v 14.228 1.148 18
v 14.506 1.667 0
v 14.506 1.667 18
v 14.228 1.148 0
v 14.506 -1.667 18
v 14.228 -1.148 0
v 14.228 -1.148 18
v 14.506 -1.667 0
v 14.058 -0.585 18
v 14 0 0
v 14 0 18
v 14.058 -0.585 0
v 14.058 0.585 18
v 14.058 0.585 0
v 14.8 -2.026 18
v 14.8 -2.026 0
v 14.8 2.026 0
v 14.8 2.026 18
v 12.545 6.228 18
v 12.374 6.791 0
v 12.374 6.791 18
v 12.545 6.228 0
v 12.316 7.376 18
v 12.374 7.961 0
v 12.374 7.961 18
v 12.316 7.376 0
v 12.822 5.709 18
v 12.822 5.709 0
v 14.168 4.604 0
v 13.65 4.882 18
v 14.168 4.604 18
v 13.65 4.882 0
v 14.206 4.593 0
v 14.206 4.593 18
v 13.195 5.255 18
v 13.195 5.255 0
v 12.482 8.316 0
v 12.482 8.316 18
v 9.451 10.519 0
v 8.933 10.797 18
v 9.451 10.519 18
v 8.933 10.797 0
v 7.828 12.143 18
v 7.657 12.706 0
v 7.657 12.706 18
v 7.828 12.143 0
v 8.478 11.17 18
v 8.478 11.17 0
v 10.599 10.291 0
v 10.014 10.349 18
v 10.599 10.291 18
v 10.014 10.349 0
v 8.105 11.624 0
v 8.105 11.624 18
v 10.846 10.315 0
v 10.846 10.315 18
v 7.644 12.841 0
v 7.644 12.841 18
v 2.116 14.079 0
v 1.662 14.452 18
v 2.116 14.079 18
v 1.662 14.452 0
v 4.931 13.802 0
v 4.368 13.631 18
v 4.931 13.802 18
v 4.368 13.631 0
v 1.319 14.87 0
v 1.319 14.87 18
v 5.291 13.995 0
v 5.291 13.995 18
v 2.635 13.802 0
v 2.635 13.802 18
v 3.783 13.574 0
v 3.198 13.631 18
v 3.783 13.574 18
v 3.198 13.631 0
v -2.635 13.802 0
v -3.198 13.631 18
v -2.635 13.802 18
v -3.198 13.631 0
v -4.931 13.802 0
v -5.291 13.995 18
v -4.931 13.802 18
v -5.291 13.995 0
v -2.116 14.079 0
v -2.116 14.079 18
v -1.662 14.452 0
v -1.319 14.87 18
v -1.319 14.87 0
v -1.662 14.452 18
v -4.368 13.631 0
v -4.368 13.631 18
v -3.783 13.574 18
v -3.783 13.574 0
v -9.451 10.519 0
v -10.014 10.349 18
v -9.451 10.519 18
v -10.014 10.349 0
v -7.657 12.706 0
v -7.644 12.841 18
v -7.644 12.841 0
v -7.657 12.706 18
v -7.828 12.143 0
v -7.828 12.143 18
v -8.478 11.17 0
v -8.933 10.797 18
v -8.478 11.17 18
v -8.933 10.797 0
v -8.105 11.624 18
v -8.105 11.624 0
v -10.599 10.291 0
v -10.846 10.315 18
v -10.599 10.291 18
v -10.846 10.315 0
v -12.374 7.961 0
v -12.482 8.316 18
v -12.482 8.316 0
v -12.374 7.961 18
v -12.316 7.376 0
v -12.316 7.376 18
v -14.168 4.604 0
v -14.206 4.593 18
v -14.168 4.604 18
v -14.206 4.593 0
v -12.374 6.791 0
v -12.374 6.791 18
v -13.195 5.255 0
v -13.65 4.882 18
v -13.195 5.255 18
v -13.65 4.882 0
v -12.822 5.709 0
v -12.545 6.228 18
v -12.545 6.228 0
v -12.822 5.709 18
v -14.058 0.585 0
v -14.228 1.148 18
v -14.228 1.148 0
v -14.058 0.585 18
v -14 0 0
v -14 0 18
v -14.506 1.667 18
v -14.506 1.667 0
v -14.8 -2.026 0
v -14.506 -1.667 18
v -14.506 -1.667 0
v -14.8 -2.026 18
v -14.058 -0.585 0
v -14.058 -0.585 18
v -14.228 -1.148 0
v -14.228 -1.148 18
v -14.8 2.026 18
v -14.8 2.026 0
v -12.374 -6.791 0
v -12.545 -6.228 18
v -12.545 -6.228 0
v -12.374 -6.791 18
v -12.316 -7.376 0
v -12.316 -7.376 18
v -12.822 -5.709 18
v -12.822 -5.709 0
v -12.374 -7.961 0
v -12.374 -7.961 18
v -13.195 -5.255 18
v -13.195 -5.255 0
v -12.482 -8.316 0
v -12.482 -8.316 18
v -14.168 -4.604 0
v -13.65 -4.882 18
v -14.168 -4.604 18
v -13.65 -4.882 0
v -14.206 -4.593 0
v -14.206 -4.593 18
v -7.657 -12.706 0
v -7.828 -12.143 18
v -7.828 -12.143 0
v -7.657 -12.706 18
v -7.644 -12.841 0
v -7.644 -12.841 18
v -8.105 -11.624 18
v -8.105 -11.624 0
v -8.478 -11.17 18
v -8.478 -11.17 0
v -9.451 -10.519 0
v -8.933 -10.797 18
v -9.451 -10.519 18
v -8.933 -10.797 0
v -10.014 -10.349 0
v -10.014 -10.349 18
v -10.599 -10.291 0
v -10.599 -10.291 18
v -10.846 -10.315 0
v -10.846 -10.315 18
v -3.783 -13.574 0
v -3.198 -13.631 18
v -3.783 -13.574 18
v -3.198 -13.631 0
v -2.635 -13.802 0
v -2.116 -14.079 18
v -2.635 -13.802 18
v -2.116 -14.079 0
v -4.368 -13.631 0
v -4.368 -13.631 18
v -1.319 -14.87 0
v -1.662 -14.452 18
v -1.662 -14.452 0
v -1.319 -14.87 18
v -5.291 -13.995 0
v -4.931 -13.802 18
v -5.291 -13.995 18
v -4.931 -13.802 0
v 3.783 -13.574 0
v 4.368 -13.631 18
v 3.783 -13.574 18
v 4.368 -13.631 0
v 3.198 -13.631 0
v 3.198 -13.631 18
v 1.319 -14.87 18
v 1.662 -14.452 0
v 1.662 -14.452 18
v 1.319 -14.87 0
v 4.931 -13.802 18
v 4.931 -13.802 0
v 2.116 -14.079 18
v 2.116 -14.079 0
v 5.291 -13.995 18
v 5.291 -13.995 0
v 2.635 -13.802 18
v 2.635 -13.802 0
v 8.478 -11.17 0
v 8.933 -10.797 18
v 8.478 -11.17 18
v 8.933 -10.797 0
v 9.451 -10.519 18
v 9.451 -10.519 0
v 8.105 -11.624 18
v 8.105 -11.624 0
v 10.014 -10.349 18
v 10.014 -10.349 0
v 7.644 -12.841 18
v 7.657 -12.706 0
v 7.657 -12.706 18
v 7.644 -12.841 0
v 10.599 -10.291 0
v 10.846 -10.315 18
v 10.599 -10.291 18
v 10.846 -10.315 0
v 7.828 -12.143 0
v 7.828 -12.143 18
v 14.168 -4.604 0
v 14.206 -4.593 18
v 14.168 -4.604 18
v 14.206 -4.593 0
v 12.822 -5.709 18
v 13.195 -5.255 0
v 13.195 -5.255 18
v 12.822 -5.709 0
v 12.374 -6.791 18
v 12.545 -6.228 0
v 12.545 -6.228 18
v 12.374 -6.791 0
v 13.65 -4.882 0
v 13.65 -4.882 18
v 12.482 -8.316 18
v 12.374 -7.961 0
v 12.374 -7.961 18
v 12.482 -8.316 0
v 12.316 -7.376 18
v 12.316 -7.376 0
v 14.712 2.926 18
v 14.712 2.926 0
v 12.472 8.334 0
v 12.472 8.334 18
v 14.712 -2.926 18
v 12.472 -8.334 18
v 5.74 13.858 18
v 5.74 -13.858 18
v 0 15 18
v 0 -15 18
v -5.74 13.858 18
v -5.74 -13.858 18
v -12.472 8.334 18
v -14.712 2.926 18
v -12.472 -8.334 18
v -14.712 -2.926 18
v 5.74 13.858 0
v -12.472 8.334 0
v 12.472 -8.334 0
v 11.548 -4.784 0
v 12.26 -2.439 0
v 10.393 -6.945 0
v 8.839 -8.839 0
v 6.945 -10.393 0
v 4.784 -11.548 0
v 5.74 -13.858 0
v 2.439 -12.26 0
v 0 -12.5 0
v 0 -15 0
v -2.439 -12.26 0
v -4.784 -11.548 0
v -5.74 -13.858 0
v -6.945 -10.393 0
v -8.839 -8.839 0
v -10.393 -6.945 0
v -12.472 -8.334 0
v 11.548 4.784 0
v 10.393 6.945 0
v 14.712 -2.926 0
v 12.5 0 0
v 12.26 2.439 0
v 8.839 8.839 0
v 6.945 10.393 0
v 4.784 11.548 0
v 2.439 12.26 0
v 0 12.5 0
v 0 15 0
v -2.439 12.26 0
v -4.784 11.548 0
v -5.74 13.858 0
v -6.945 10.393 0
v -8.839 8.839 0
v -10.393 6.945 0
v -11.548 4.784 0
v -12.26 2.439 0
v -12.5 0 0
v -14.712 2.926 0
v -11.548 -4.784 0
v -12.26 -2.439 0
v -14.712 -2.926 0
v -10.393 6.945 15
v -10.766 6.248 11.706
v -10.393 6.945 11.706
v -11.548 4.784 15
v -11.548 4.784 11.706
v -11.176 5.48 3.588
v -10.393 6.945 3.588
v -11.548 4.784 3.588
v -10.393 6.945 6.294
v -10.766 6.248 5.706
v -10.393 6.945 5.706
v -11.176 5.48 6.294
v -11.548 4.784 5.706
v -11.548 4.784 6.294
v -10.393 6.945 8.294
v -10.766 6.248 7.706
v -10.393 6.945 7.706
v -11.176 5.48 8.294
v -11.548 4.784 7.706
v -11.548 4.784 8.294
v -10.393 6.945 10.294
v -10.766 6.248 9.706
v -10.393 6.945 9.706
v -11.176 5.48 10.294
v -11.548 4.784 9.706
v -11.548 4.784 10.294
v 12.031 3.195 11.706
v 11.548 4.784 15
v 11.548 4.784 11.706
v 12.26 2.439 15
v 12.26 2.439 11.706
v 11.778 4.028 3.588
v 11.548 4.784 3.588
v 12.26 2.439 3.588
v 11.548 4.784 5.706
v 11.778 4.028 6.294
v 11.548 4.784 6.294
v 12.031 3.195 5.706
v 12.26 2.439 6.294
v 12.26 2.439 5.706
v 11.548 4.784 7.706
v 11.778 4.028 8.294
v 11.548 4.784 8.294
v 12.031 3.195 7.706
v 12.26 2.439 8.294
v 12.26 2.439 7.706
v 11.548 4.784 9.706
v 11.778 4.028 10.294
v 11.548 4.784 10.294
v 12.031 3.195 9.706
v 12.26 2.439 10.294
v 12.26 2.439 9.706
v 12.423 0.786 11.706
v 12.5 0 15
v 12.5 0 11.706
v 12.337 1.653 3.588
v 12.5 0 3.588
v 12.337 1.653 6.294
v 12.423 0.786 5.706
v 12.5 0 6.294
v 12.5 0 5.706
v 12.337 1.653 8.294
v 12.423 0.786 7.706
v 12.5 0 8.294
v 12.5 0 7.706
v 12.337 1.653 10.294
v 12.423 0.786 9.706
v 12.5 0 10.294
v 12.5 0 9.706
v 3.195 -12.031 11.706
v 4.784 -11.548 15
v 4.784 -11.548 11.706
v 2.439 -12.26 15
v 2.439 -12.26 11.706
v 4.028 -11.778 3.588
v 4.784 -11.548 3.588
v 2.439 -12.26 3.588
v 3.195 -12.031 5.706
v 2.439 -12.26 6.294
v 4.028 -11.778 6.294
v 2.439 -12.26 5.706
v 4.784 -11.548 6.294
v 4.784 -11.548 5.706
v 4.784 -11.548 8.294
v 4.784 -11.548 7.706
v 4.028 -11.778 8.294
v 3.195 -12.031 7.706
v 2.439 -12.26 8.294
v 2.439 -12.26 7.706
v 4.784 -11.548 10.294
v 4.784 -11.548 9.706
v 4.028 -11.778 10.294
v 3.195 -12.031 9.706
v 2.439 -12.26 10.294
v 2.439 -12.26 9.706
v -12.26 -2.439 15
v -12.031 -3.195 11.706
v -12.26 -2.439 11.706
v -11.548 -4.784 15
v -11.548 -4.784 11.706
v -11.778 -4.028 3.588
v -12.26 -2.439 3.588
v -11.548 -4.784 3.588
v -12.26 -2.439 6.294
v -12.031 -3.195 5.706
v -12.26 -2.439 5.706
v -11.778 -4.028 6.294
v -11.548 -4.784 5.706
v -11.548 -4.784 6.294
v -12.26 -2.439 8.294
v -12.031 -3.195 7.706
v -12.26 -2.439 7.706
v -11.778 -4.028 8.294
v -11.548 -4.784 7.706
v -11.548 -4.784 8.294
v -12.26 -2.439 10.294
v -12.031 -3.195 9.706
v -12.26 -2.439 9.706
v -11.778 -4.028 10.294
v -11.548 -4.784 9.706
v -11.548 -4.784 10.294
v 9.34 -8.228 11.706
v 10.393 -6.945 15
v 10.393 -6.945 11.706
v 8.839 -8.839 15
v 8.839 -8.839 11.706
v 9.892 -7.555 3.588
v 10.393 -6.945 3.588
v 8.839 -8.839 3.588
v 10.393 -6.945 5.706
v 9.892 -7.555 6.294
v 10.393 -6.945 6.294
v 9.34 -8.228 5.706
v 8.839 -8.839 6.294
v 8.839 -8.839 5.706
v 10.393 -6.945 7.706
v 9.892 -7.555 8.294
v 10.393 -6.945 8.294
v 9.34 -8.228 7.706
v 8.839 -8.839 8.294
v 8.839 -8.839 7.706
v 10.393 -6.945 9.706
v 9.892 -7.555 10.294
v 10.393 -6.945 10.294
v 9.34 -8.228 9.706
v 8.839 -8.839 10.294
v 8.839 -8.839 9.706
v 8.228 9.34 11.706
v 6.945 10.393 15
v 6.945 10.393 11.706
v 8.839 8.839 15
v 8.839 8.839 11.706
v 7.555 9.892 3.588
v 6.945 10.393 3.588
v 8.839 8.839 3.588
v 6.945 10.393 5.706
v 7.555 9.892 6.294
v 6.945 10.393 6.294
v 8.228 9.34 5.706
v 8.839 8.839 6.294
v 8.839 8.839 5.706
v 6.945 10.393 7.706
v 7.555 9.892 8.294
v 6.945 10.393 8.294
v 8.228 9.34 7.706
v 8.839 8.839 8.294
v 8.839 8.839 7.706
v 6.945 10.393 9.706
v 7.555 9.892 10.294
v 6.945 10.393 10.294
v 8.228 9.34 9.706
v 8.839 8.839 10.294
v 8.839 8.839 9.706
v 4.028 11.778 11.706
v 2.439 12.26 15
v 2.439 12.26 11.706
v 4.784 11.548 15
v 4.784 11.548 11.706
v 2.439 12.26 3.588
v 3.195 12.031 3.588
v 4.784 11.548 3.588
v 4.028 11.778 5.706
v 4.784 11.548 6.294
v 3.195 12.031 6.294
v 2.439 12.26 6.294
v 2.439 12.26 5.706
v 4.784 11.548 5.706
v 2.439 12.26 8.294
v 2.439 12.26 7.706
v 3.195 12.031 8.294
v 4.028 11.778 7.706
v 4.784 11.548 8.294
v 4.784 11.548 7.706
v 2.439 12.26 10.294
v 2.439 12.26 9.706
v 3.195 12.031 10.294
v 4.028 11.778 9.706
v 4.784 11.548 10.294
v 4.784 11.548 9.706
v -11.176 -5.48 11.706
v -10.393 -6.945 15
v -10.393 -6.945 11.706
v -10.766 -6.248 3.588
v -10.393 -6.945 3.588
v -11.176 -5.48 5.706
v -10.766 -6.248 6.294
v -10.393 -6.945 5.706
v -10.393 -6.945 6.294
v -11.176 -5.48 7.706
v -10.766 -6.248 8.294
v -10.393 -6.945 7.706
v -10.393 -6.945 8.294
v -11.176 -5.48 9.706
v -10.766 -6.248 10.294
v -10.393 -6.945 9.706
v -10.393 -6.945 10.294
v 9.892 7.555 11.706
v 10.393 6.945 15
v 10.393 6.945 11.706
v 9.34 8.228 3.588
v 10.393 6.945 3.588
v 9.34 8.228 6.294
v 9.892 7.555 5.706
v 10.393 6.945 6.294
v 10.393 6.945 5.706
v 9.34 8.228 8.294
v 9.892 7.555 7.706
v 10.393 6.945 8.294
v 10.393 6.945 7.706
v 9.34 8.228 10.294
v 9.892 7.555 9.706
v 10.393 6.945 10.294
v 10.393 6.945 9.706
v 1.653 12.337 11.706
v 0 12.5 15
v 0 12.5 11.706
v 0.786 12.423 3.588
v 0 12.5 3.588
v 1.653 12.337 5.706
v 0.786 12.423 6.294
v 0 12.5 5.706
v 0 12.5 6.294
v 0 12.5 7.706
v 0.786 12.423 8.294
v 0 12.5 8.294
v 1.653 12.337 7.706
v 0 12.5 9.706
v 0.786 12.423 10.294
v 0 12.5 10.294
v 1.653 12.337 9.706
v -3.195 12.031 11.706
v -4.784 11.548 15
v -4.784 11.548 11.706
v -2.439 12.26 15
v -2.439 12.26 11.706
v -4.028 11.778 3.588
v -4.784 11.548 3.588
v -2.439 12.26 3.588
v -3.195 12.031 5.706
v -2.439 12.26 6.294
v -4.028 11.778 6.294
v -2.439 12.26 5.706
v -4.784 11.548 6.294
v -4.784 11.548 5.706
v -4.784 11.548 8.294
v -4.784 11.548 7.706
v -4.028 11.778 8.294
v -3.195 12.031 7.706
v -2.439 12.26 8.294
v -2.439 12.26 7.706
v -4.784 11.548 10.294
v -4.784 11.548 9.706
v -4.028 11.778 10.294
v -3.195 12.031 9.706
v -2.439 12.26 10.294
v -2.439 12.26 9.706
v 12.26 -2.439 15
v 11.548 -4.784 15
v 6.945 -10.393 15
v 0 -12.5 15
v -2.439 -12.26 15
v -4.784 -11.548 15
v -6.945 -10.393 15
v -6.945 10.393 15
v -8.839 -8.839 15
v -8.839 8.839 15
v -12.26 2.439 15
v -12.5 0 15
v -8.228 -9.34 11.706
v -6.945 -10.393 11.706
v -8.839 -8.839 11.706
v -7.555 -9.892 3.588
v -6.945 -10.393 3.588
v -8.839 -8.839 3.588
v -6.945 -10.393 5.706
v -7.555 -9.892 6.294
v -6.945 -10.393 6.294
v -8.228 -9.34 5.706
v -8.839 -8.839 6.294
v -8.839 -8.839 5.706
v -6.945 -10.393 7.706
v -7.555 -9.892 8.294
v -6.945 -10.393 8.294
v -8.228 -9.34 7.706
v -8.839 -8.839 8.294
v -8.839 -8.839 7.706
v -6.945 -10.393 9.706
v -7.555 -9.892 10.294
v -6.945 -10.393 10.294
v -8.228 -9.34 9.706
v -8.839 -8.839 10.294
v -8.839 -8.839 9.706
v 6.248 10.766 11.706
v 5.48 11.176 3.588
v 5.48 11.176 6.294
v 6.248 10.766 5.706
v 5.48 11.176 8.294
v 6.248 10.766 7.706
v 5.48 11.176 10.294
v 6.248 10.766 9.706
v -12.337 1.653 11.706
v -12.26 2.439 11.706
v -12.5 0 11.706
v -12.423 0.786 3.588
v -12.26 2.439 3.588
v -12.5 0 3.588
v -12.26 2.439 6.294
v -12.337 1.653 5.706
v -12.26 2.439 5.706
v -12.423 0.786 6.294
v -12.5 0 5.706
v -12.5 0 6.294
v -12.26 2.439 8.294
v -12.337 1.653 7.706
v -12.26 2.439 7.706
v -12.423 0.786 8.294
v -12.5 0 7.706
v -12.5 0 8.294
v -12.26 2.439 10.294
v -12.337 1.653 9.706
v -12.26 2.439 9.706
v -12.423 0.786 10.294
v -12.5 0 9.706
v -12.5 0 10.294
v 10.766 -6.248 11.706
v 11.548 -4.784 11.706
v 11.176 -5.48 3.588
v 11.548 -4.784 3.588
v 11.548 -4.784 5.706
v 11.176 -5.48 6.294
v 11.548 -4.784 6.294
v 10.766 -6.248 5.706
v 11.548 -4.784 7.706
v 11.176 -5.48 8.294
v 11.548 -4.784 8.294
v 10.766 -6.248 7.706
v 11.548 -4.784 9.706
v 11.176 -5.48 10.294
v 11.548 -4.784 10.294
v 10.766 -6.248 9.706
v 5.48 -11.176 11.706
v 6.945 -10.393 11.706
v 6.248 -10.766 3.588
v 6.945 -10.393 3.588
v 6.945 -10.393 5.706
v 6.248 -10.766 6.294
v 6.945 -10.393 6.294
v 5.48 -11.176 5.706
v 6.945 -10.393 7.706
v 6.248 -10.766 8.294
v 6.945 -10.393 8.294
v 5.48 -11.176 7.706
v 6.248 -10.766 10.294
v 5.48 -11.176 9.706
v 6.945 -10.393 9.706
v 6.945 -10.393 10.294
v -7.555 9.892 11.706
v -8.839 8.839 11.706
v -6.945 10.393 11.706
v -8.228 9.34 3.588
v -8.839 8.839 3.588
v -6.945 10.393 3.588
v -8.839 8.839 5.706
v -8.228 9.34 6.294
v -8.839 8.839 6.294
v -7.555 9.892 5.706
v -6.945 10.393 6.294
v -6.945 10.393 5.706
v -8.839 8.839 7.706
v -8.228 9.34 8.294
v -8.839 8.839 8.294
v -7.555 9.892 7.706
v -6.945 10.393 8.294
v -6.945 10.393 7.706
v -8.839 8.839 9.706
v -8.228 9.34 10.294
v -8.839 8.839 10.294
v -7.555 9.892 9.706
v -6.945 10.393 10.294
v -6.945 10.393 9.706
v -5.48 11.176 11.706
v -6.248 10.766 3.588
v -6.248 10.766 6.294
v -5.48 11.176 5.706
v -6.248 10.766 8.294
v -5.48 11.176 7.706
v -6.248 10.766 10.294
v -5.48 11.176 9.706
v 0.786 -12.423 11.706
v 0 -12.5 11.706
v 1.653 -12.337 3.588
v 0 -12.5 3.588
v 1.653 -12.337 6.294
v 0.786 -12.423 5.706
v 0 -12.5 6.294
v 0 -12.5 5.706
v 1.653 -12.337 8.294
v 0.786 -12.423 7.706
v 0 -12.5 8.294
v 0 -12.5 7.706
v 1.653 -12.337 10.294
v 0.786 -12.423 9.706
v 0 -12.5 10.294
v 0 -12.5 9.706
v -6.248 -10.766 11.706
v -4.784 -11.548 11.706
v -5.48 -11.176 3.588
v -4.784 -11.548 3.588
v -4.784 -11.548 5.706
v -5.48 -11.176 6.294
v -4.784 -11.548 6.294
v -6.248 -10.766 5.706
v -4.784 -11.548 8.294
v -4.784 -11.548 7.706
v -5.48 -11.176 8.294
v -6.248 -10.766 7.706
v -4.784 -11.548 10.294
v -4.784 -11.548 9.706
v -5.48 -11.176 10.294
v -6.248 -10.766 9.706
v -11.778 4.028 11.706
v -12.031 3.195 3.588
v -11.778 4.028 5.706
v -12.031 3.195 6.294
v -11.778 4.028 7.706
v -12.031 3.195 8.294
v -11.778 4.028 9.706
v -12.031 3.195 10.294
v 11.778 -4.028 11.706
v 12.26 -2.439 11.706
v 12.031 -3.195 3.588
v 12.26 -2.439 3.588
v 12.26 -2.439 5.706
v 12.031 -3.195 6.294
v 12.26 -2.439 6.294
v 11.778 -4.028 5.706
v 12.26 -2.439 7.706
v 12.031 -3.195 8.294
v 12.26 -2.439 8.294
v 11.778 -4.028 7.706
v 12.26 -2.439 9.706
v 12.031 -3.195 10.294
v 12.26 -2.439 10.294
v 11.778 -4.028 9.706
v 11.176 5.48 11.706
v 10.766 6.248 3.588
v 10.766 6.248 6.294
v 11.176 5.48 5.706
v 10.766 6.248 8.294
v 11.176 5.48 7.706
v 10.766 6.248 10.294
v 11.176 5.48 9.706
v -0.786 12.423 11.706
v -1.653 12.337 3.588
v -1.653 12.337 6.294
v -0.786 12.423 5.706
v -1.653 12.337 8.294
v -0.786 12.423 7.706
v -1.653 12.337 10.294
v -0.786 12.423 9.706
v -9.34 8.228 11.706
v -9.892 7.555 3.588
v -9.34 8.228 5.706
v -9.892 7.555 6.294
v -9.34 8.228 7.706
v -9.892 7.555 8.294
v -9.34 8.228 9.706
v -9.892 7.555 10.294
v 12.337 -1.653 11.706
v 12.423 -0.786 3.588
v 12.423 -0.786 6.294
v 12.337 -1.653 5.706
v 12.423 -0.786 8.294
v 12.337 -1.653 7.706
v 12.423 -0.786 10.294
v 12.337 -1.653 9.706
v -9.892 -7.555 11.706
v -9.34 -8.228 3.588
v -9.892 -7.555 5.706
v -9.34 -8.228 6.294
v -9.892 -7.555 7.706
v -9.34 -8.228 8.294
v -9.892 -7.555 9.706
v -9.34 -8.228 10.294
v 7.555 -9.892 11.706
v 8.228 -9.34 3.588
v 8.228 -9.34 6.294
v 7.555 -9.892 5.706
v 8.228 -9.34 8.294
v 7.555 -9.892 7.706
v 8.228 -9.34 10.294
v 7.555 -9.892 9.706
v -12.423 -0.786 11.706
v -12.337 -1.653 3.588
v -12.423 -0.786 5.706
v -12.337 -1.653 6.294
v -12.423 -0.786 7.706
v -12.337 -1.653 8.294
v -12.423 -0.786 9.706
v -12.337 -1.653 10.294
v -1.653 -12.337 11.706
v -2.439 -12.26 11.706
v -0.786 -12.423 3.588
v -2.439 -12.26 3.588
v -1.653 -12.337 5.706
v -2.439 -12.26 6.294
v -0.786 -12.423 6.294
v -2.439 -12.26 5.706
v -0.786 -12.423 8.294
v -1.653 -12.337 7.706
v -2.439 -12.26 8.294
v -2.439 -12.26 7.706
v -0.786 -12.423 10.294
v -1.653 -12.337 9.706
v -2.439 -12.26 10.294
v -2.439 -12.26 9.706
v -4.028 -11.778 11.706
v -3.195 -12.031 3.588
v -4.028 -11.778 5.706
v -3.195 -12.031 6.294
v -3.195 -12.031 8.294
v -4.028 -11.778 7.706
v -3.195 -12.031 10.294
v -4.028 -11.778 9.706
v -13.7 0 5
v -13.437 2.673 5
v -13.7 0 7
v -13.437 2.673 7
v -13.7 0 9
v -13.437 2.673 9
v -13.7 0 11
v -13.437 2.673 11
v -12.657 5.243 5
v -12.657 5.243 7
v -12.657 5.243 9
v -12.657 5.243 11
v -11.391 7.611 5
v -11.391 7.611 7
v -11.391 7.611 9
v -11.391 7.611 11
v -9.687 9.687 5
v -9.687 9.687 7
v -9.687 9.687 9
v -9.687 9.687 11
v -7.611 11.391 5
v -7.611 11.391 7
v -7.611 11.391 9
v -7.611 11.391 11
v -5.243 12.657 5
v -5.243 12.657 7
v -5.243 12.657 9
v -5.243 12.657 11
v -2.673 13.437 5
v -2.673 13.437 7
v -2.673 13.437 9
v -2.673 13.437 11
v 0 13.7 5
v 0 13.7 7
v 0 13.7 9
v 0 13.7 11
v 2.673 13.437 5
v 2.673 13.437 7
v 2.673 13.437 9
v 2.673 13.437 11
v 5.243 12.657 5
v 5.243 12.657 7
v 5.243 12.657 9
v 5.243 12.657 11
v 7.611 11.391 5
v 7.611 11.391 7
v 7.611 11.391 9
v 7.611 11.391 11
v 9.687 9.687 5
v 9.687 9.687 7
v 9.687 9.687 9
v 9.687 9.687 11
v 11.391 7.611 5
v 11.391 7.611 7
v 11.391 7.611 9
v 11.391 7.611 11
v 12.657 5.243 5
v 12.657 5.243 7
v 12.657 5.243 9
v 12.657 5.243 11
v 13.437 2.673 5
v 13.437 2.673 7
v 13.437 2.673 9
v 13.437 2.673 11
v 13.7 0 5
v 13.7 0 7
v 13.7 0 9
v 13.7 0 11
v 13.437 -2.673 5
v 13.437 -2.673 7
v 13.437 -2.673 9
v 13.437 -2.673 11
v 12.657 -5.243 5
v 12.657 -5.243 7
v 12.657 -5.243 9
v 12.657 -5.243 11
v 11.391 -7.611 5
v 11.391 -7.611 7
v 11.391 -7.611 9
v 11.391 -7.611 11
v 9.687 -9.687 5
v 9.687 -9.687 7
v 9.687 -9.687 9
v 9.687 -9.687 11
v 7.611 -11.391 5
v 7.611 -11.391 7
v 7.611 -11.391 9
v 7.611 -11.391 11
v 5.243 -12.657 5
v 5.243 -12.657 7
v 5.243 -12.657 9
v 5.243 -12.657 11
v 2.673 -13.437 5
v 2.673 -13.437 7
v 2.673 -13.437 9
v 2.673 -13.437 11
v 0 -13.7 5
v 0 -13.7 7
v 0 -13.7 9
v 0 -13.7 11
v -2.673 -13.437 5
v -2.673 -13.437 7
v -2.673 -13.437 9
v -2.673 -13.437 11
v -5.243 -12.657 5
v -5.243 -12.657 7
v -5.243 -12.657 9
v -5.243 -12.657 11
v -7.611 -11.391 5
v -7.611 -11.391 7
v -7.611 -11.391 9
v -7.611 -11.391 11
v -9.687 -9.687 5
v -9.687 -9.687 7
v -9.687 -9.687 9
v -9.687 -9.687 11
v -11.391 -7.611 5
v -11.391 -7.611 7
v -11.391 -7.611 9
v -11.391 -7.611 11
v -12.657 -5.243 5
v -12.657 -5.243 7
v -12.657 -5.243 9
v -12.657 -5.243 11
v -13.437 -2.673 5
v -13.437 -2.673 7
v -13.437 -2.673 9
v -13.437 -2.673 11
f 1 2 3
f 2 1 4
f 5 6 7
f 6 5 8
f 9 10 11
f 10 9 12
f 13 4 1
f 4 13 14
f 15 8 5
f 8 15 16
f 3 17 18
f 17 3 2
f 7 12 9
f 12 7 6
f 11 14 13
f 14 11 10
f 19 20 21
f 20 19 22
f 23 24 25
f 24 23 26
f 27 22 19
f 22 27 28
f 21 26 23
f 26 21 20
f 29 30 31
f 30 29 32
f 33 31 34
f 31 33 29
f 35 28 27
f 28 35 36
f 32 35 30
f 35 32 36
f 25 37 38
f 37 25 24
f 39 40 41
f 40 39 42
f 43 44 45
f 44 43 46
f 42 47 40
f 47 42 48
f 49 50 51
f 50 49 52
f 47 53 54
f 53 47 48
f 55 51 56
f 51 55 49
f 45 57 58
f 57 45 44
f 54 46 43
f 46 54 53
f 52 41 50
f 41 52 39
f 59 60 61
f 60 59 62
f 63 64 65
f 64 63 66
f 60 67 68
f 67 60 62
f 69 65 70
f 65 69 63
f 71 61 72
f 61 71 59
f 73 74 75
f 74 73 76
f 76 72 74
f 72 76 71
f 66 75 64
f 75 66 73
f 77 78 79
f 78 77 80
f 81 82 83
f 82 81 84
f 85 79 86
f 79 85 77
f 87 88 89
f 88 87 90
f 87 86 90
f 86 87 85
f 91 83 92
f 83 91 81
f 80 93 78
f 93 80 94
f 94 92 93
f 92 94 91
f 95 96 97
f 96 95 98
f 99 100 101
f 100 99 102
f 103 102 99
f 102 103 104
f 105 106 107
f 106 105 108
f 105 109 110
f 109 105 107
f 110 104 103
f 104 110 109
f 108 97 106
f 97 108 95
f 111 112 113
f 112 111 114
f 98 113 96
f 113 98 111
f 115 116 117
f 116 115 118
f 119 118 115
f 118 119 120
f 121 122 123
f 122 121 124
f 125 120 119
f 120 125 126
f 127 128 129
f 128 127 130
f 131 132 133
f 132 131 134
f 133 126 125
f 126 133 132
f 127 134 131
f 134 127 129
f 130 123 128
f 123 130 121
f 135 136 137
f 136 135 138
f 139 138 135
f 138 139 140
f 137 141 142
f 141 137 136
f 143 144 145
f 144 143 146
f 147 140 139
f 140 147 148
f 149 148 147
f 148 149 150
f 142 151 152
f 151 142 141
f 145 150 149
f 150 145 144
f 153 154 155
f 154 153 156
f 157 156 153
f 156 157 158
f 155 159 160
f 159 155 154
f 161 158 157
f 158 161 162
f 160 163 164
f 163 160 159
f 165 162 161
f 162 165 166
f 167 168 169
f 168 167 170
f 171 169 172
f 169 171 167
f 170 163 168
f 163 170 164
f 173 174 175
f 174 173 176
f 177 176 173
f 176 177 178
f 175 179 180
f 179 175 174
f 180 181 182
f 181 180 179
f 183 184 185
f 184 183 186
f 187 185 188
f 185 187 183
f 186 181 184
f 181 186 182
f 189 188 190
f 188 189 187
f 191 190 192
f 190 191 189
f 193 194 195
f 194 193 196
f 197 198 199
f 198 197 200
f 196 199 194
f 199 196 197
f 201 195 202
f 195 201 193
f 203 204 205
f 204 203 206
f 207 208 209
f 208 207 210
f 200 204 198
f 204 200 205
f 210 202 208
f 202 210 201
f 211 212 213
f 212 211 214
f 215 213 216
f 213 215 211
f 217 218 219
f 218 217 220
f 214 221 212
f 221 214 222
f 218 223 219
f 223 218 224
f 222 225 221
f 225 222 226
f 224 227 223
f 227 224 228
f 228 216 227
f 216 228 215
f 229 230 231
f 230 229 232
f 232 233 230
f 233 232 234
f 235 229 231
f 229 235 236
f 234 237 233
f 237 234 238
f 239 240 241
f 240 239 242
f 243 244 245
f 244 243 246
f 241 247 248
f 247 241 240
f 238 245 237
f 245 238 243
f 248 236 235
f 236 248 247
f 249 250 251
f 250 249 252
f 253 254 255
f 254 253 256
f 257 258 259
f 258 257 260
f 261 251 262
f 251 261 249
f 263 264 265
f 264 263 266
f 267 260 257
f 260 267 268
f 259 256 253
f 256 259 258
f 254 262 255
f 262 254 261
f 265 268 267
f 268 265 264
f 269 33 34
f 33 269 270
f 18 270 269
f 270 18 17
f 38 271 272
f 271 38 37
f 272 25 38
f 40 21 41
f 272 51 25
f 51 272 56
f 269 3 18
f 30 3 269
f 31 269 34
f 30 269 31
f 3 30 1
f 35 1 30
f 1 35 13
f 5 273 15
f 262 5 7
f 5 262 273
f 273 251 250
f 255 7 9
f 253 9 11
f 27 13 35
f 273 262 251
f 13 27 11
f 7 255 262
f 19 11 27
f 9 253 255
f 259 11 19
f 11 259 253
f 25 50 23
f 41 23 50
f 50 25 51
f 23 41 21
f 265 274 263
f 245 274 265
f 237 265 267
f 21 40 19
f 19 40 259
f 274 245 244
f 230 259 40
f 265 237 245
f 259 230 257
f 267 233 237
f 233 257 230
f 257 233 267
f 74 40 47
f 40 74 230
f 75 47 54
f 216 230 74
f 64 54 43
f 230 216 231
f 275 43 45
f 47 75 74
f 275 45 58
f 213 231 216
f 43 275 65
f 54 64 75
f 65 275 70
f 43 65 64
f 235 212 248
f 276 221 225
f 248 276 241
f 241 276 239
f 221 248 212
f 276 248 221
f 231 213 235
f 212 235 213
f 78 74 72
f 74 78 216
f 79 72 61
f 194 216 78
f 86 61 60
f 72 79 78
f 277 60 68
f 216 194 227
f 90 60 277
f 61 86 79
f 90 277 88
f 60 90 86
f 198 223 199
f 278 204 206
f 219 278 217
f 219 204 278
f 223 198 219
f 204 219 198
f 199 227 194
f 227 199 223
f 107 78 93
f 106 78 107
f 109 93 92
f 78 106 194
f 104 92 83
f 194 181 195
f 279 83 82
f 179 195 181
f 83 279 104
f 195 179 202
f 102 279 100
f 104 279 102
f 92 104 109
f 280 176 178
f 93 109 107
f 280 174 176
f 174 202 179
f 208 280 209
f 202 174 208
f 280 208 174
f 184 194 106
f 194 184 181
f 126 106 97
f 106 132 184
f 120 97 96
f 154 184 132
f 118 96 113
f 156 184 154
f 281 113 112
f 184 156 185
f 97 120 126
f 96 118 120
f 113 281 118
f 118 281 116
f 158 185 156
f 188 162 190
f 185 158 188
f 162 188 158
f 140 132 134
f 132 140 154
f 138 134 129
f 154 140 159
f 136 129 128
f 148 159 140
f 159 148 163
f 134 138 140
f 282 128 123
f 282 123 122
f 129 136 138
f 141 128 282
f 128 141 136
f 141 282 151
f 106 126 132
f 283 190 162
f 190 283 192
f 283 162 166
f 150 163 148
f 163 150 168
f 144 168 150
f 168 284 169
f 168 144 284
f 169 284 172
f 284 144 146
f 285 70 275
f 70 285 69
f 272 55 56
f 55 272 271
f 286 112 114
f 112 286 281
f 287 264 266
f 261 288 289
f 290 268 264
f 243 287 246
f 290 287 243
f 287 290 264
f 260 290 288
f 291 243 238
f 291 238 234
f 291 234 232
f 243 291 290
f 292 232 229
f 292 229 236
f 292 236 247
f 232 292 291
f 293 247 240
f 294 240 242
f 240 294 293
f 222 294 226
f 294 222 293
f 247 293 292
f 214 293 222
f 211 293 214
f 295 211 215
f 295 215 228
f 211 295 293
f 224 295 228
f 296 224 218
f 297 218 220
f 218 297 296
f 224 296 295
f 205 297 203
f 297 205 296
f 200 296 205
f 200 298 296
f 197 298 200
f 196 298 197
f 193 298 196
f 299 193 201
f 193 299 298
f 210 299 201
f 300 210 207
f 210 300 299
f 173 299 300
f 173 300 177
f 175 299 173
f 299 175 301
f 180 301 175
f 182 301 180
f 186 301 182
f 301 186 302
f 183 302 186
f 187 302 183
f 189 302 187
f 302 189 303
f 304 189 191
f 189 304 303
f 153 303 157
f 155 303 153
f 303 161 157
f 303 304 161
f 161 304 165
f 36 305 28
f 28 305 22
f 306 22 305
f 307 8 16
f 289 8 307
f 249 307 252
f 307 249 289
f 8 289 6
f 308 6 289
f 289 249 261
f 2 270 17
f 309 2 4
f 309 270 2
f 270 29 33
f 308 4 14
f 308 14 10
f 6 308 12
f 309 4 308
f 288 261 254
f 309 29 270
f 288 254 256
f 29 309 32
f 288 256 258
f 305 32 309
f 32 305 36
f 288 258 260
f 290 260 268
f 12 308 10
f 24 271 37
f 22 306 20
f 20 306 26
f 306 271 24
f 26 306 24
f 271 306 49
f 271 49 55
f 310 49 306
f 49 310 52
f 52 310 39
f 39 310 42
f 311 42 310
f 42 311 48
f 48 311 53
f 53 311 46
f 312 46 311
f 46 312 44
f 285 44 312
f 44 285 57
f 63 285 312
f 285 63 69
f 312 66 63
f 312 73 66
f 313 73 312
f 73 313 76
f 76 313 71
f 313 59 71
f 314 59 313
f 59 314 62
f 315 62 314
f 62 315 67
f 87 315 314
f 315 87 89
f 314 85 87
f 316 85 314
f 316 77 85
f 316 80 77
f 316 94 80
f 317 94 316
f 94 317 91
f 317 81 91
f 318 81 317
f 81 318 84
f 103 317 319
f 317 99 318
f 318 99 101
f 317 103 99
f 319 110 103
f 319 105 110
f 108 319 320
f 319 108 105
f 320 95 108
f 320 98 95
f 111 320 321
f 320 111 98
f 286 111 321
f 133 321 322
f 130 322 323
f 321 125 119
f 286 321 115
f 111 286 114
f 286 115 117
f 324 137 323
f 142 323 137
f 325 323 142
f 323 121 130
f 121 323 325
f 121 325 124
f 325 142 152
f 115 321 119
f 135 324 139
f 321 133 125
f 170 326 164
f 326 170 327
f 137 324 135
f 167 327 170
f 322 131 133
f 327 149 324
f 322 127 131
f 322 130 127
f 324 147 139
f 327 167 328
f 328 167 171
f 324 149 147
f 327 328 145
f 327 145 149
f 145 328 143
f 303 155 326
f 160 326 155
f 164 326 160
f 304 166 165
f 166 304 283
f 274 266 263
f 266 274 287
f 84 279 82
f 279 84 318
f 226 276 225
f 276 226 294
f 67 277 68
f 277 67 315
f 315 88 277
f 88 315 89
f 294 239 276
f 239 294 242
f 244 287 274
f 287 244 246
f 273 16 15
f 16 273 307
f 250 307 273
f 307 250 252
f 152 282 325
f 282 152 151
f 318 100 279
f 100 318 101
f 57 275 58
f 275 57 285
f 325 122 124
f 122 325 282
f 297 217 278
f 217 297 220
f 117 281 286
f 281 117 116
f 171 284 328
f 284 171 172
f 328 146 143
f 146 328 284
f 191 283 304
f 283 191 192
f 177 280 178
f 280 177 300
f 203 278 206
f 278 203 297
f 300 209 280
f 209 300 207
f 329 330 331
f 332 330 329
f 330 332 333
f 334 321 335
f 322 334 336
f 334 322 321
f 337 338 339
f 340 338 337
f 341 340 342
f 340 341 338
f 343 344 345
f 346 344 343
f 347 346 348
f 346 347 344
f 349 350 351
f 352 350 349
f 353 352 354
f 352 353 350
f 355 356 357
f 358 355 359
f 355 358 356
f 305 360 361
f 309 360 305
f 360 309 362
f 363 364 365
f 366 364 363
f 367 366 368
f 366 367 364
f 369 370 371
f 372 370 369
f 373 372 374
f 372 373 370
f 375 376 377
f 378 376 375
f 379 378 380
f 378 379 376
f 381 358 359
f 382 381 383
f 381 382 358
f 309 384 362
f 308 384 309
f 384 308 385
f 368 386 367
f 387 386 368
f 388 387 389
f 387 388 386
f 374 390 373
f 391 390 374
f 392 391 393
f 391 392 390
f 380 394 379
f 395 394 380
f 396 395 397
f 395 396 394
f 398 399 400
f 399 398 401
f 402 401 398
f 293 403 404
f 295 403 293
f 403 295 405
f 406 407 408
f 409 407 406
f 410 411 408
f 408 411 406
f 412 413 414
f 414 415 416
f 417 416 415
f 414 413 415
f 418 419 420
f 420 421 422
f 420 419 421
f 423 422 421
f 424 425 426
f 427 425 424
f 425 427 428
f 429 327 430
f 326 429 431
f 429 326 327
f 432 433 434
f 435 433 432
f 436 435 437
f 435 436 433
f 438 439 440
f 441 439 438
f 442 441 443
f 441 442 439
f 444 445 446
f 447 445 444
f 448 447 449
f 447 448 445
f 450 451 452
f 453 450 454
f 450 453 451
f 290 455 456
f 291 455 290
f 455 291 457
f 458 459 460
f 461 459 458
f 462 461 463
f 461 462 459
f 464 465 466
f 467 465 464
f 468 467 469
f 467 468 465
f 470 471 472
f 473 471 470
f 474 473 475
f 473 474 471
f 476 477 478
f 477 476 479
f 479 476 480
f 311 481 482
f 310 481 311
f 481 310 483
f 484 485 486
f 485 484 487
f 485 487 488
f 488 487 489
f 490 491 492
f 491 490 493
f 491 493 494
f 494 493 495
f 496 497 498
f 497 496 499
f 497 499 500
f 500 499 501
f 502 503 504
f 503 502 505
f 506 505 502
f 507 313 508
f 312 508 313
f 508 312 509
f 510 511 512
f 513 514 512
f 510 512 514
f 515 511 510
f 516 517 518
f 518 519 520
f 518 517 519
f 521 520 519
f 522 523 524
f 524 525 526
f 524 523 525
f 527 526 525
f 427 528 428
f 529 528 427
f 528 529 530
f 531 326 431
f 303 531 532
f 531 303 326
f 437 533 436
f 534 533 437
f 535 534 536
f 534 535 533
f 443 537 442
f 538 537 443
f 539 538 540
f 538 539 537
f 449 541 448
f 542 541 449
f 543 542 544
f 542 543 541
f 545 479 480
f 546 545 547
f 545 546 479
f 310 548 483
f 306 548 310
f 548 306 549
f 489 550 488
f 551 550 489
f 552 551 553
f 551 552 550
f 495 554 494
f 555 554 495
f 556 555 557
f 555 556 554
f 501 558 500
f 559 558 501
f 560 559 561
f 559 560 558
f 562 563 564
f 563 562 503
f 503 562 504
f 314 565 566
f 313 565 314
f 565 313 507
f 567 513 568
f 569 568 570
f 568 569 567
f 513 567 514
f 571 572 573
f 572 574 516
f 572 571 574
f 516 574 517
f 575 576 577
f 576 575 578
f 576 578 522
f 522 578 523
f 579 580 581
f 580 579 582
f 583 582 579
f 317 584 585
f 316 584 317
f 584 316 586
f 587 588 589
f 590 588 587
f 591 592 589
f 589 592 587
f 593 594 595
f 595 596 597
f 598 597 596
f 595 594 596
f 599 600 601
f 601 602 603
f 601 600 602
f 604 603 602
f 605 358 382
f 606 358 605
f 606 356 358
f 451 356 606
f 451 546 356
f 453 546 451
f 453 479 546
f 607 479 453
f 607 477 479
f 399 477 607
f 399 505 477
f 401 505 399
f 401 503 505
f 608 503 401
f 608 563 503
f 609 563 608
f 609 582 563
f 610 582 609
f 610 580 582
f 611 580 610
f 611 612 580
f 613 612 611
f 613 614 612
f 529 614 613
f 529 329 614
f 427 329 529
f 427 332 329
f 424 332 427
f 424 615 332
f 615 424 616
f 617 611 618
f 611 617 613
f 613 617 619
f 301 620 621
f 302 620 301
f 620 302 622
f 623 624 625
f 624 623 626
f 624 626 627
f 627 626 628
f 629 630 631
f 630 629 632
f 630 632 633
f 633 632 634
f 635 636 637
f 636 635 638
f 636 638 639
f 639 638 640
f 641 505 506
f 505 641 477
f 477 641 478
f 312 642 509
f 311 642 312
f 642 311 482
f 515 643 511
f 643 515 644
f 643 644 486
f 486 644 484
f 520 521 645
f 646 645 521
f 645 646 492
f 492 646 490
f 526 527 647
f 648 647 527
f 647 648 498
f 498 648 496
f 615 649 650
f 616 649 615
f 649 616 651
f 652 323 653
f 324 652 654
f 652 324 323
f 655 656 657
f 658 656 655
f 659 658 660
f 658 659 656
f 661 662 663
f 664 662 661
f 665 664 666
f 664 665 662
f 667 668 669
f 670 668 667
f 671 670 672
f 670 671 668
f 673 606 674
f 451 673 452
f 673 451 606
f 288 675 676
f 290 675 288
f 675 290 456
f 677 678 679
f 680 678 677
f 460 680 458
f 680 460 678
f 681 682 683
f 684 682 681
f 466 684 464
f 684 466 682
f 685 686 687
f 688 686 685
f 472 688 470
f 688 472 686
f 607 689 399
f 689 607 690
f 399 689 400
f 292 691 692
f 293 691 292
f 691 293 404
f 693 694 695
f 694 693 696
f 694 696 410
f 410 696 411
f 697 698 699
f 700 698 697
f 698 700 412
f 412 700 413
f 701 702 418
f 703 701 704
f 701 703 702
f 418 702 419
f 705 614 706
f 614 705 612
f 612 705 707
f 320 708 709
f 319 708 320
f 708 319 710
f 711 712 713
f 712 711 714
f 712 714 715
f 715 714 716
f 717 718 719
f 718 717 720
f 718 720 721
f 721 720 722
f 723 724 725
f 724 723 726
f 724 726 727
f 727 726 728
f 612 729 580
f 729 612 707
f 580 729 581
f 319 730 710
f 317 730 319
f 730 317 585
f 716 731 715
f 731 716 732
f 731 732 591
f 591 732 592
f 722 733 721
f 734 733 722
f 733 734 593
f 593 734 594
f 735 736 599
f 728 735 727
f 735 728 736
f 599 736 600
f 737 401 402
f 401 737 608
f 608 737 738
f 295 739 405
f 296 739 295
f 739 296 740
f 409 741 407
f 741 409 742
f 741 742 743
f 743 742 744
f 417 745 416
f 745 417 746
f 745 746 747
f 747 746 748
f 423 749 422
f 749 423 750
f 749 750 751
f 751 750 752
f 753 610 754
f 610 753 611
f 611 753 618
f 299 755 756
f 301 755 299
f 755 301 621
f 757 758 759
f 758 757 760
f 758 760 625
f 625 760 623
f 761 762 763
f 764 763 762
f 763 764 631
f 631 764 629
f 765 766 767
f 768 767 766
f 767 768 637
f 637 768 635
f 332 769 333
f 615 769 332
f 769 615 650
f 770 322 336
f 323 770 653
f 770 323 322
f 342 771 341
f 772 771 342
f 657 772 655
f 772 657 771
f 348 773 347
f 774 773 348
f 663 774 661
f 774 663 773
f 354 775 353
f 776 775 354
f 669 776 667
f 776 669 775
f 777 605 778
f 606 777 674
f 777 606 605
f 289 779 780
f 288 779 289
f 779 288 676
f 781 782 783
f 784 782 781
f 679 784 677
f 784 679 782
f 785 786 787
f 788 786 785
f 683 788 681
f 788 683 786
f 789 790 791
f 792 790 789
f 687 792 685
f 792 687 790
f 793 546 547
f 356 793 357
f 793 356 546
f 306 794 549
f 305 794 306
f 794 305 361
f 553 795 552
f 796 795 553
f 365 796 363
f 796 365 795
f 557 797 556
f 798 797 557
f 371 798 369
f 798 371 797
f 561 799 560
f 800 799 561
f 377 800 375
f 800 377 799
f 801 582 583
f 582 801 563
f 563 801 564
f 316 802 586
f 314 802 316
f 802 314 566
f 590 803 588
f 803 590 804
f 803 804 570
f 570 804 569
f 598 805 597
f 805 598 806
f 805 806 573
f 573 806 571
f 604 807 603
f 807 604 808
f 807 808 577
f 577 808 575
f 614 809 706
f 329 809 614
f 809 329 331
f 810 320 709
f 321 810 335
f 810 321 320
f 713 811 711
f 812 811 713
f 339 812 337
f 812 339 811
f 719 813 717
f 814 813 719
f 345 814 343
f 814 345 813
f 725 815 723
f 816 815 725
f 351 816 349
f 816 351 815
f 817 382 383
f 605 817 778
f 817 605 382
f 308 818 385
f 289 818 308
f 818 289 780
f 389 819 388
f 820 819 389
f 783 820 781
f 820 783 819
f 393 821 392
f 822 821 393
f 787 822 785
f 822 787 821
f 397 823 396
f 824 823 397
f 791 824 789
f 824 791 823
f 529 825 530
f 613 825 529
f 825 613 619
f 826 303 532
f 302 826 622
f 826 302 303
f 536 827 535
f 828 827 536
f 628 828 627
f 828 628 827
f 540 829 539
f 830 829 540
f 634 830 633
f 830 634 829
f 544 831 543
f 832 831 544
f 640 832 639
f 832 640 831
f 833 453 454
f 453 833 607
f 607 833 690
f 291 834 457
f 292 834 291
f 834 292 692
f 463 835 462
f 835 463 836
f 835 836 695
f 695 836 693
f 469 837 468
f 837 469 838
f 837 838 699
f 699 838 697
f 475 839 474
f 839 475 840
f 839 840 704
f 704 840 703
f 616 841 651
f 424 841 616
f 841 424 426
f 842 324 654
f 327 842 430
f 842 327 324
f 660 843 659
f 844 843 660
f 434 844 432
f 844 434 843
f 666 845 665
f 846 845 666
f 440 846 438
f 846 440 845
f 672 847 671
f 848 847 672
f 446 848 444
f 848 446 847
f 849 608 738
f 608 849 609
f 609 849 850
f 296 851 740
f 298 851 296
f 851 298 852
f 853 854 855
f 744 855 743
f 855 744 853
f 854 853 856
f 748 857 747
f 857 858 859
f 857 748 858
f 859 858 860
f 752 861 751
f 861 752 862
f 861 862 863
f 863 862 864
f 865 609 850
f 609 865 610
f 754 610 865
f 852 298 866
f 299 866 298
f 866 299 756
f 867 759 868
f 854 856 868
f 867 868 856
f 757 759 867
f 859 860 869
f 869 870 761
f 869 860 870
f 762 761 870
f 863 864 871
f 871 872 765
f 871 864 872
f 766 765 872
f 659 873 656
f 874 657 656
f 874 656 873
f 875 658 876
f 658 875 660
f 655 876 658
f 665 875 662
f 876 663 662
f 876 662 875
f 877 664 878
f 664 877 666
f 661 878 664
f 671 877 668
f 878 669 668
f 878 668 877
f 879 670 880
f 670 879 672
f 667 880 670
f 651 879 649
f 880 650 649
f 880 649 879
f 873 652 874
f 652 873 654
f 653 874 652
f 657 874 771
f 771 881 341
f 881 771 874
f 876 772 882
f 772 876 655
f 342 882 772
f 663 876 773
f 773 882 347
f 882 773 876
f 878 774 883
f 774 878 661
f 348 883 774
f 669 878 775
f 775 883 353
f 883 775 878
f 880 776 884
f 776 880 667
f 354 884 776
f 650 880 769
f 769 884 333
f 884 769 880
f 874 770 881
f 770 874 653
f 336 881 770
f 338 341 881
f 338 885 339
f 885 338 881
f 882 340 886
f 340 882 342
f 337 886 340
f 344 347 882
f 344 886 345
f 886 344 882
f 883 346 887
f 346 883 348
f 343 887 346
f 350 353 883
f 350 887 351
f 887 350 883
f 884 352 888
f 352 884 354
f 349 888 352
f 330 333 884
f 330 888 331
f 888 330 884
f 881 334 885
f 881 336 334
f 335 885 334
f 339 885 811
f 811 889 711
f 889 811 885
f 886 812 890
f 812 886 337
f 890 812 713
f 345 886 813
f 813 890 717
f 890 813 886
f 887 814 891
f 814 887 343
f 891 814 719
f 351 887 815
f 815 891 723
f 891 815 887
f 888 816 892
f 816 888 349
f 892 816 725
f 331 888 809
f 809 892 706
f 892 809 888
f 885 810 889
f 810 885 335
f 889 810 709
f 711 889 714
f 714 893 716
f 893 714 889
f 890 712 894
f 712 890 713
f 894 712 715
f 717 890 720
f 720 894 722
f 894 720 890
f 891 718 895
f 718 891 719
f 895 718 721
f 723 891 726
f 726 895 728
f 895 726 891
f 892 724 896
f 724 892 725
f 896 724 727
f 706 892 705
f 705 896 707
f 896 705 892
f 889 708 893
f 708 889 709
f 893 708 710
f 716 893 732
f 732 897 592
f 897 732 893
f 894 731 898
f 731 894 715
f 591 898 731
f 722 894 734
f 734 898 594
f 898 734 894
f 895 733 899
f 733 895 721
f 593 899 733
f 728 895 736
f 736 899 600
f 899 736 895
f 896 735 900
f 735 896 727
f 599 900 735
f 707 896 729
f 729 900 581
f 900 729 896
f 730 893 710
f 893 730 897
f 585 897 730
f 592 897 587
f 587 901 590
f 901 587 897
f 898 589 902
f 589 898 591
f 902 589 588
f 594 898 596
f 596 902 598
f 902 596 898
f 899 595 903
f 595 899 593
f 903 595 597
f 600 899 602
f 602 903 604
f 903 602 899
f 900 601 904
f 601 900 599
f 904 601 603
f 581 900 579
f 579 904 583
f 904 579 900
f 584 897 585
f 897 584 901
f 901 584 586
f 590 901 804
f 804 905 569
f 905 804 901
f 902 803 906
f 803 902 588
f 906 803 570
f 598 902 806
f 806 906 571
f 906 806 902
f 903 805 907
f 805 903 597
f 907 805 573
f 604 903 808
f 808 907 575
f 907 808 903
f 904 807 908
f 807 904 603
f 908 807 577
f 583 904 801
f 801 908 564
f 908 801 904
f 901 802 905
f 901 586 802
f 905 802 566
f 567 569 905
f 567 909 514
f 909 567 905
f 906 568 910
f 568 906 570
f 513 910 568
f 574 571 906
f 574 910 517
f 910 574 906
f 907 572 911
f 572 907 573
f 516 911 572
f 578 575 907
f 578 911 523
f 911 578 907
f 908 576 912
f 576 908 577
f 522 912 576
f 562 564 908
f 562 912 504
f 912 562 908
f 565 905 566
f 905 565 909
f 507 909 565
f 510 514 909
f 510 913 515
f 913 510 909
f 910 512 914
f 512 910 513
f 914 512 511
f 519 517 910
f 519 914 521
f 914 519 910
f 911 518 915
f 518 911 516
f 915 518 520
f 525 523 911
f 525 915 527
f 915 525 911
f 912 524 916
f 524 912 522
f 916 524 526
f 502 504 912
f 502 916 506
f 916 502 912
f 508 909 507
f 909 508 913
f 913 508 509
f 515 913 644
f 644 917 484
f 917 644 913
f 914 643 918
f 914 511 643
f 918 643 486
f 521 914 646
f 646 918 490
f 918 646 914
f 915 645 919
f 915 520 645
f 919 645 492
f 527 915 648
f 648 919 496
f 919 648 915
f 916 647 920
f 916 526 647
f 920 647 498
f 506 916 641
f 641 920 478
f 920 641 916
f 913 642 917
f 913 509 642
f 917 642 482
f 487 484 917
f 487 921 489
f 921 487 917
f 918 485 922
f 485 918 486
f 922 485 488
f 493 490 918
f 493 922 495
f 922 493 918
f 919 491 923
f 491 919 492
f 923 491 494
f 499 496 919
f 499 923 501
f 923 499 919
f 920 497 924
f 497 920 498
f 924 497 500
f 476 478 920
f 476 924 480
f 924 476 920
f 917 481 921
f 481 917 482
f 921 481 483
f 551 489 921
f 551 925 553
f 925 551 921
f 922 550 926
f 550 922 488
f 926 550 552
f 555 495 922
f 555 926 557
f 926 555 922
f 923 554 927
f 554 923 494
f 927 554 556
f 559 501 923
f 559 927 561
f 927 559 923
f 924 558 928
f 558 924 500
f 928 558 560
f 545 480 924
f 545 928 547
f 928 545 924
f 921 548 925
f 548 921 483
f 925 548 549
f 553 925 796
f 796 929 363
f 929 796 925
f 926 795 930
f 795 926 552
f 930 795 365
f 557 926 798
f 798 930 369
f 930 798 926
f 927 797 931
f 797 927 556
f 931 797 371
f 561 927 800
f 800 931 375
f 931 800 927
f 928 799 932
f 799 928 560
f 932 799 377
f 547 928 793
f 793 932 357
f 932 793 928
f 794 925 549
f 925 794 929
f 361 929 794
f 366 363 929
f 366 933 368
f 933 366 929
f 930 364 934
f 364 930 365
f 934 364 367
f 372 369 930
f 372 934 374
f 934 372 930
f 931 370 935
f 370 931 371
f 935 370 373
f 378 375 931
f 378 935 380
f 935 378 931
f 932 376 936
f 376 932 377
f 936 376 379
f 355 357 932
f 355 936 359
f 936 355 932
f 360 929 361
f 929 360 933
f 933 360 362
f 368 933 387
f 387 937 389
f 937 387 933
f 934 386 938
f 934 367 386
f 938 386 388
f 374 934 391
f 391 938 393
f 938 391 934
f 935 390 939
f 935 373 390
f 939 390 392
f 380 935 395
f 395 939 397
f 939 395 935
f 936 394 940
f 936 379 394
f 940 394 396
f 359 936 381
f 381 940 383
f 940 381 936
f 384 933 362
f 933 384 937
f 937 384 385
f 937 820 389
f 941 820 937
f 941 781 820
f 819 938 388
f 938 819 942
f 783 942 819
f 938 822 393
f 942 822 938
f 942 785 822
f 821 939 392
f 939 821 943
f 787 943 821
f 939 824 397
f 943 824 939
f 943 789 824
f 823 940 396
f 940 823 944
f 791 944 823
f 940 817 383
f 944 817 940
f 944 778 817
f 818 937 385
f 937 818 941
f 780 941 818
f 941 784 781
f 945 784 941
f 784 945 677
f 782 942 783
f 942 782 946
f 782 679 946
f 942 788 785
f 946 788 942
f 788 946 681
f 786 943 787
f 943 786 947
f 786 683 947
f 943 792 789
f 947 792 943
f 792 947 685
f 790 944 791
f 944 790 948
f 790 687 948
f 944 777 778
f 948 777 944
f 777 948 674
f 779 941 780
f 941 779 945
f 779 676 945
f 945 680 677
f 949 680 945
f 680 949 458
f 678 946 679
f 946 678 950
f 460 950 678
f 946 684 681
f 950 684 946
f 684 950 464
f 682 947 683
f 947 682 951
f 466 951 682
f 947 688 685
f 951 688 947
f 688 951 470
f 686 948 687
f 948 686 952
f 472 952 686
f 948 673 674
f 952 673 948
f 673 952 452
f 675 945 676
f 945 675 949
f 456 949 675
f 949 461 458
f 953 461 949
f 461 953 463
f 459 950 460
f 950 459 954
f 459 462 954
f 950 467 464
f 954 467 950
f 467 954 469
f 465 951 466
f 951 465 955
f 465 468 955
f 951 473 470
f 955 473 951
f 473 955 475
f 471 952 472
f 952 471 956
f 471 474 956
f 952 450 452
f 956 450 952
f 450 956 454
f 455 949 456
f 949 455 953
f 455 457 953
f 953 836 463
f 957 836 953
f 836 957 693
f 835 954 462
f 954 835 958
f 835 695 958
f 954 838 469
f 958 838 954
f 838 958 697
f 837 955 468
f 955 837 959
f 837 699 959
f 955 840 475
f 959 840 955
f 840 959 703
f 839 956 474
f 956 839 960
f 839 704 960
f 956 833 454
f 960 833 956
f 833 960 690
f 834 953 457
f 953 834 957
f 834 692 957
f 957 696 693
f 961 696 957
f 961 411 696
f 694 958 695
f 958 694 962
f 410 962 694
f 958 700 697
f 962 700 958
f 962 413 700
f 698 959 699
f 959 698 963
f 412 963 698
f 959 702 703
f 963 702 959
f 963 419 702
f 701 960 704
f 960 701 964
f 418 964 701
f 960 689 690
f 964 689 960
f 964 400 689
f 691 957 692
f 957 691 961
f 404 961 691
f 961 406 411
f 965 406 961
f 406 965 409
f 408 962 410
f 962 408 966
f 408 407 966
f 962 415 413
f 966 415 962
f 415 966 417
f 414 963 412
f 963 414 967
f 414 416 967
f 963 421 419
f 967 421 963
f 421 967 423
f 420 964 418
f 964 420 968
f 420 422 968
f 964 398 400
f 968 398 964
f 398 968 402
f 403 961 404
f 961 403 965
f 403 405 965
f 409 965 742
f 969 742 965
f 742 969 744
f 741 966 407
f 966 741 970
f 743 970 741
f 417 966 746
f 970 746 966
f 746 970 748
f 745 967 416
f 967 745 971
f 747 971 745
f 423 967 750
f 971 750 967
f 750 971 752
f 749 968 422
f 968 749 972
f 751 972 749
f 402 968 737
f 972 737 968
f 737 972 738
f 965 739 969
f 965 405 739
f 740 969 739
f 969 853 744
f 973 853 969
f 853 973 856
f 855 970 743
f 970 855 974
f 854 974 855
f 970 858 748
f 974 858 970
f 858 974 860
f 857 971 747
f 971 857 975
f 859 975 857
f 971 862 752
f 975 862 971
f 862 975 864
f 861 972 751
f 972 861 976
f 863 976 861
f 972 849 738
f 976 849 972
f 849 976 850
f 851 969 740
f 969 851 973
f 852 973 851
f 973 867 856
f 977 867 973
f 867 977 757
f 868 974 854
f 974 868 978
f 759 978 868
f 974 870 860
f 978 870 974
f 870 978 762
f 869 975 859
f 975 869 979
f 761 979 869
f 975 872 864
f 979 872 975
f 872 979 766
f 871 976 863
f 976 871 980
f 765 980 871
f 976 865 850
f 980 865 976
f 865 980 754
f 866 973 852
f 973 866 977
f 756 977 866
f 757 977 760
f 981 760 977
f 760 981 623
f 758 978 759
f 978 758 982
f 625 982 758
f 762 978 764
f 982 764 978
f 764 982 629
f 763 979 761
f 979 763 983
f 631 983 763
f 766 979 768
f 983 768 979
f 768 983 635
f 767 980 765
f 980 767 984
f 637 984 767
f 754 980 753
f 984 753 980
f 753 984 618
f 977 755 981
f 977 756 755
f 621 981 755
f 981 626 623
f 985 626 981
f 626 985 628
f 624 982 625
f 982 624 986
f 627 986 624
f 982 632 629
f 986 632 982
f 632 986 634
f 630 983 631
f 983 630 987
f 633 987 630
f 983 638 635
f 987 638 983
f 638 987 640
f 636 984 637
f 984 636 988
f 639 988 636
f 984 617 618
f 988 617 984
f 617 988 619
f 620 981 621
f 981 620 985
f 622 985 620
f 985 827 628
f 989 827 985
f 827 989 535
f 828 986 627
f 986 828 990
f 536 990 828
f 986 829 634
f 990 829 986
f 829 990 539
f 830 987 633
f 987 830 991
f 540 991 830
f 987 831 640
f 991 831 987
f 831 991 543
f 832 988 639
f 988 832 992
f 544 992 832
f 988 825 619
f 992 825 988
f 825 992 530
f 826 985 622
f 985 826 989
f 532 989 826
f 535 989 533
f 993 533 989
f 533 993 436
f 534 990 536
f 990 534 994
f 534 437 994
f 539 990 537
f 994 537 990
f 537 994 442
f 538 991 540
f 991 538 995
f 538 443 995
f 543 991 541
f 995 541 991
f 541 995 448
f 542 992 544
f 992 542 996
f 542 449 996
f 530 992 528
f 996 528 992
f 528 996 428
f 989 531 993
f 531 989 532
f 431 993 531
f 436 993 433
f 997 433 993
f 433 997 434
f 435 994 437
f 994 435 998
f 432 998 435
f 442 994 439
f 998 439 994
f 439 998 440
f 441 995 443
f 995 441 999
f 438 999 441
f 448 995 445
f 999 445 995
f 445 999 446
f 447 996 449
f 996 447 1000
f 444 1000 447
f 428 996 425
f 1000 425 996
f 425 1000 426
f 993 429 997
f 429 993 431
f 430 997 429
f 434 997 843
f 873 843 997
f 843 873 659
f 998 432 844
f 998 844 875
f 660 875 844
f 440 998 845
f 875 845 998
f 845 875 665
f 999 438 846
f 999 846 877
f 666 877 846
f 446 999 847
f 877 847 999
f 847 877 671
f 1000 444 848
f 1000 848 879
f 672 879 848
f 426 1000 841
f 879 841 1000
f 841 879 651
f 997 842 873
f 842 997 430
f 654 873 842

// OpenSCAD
$fn = 32;

// ----------------------------------------------------------------------
// Threaded cap: 30 mm body, 18 mm tall, 25 mm threaded bore
// ----------------------------------------------------------------------

// --- parameters (mm) ---
outer_d = 30;             // cap outside diameter
body_h = 18;              // cap height
top_t = 3;                // closed top thickness
bore_d = 25;              // bore core diameter
pitch = 2;                // thread pitch
thread_d = 1.2;           // thread depth
thread_z = 3;             // thread start above the rim
thread_h = 9;             // threaded height
flutes = 14;              // number of knurl flutes
flute_d = 6;              // flute cutter diameter
flute_depth = 1;          // flute depth into the rim

difference() {
  union() {
    cylinder(h = 18, d = outer_d);
  }
  /* threaded bore, closed at the top */
  translate([0, 0, -2.5]) cylinder(h = 17.5, d = bore_d);
  translate([0, 0, 3]) rotate_extrude() polygon([[11.5, 0], [11.5, 9], [12, 9], [13.7, 8], [12, 7], [13.7, 6], [12, 5], [13.7, 4], [12, 3], [13.7, 2], [12, 0], [11.5, 0]]);
  /* knurl flutes around the rim */
  for (i = [0 : flutes - 1]) {
    a = i * 360 / flutes;
    translate([(outer_d / 2 + flute_d / 2 - flute_depth) * cos(a), (outer_d / 2 + flute_d / 2 - flute_depth) * sin(a), -2.5]) cylinder(h = body_h + 5, d = flute_d);
  }
}
